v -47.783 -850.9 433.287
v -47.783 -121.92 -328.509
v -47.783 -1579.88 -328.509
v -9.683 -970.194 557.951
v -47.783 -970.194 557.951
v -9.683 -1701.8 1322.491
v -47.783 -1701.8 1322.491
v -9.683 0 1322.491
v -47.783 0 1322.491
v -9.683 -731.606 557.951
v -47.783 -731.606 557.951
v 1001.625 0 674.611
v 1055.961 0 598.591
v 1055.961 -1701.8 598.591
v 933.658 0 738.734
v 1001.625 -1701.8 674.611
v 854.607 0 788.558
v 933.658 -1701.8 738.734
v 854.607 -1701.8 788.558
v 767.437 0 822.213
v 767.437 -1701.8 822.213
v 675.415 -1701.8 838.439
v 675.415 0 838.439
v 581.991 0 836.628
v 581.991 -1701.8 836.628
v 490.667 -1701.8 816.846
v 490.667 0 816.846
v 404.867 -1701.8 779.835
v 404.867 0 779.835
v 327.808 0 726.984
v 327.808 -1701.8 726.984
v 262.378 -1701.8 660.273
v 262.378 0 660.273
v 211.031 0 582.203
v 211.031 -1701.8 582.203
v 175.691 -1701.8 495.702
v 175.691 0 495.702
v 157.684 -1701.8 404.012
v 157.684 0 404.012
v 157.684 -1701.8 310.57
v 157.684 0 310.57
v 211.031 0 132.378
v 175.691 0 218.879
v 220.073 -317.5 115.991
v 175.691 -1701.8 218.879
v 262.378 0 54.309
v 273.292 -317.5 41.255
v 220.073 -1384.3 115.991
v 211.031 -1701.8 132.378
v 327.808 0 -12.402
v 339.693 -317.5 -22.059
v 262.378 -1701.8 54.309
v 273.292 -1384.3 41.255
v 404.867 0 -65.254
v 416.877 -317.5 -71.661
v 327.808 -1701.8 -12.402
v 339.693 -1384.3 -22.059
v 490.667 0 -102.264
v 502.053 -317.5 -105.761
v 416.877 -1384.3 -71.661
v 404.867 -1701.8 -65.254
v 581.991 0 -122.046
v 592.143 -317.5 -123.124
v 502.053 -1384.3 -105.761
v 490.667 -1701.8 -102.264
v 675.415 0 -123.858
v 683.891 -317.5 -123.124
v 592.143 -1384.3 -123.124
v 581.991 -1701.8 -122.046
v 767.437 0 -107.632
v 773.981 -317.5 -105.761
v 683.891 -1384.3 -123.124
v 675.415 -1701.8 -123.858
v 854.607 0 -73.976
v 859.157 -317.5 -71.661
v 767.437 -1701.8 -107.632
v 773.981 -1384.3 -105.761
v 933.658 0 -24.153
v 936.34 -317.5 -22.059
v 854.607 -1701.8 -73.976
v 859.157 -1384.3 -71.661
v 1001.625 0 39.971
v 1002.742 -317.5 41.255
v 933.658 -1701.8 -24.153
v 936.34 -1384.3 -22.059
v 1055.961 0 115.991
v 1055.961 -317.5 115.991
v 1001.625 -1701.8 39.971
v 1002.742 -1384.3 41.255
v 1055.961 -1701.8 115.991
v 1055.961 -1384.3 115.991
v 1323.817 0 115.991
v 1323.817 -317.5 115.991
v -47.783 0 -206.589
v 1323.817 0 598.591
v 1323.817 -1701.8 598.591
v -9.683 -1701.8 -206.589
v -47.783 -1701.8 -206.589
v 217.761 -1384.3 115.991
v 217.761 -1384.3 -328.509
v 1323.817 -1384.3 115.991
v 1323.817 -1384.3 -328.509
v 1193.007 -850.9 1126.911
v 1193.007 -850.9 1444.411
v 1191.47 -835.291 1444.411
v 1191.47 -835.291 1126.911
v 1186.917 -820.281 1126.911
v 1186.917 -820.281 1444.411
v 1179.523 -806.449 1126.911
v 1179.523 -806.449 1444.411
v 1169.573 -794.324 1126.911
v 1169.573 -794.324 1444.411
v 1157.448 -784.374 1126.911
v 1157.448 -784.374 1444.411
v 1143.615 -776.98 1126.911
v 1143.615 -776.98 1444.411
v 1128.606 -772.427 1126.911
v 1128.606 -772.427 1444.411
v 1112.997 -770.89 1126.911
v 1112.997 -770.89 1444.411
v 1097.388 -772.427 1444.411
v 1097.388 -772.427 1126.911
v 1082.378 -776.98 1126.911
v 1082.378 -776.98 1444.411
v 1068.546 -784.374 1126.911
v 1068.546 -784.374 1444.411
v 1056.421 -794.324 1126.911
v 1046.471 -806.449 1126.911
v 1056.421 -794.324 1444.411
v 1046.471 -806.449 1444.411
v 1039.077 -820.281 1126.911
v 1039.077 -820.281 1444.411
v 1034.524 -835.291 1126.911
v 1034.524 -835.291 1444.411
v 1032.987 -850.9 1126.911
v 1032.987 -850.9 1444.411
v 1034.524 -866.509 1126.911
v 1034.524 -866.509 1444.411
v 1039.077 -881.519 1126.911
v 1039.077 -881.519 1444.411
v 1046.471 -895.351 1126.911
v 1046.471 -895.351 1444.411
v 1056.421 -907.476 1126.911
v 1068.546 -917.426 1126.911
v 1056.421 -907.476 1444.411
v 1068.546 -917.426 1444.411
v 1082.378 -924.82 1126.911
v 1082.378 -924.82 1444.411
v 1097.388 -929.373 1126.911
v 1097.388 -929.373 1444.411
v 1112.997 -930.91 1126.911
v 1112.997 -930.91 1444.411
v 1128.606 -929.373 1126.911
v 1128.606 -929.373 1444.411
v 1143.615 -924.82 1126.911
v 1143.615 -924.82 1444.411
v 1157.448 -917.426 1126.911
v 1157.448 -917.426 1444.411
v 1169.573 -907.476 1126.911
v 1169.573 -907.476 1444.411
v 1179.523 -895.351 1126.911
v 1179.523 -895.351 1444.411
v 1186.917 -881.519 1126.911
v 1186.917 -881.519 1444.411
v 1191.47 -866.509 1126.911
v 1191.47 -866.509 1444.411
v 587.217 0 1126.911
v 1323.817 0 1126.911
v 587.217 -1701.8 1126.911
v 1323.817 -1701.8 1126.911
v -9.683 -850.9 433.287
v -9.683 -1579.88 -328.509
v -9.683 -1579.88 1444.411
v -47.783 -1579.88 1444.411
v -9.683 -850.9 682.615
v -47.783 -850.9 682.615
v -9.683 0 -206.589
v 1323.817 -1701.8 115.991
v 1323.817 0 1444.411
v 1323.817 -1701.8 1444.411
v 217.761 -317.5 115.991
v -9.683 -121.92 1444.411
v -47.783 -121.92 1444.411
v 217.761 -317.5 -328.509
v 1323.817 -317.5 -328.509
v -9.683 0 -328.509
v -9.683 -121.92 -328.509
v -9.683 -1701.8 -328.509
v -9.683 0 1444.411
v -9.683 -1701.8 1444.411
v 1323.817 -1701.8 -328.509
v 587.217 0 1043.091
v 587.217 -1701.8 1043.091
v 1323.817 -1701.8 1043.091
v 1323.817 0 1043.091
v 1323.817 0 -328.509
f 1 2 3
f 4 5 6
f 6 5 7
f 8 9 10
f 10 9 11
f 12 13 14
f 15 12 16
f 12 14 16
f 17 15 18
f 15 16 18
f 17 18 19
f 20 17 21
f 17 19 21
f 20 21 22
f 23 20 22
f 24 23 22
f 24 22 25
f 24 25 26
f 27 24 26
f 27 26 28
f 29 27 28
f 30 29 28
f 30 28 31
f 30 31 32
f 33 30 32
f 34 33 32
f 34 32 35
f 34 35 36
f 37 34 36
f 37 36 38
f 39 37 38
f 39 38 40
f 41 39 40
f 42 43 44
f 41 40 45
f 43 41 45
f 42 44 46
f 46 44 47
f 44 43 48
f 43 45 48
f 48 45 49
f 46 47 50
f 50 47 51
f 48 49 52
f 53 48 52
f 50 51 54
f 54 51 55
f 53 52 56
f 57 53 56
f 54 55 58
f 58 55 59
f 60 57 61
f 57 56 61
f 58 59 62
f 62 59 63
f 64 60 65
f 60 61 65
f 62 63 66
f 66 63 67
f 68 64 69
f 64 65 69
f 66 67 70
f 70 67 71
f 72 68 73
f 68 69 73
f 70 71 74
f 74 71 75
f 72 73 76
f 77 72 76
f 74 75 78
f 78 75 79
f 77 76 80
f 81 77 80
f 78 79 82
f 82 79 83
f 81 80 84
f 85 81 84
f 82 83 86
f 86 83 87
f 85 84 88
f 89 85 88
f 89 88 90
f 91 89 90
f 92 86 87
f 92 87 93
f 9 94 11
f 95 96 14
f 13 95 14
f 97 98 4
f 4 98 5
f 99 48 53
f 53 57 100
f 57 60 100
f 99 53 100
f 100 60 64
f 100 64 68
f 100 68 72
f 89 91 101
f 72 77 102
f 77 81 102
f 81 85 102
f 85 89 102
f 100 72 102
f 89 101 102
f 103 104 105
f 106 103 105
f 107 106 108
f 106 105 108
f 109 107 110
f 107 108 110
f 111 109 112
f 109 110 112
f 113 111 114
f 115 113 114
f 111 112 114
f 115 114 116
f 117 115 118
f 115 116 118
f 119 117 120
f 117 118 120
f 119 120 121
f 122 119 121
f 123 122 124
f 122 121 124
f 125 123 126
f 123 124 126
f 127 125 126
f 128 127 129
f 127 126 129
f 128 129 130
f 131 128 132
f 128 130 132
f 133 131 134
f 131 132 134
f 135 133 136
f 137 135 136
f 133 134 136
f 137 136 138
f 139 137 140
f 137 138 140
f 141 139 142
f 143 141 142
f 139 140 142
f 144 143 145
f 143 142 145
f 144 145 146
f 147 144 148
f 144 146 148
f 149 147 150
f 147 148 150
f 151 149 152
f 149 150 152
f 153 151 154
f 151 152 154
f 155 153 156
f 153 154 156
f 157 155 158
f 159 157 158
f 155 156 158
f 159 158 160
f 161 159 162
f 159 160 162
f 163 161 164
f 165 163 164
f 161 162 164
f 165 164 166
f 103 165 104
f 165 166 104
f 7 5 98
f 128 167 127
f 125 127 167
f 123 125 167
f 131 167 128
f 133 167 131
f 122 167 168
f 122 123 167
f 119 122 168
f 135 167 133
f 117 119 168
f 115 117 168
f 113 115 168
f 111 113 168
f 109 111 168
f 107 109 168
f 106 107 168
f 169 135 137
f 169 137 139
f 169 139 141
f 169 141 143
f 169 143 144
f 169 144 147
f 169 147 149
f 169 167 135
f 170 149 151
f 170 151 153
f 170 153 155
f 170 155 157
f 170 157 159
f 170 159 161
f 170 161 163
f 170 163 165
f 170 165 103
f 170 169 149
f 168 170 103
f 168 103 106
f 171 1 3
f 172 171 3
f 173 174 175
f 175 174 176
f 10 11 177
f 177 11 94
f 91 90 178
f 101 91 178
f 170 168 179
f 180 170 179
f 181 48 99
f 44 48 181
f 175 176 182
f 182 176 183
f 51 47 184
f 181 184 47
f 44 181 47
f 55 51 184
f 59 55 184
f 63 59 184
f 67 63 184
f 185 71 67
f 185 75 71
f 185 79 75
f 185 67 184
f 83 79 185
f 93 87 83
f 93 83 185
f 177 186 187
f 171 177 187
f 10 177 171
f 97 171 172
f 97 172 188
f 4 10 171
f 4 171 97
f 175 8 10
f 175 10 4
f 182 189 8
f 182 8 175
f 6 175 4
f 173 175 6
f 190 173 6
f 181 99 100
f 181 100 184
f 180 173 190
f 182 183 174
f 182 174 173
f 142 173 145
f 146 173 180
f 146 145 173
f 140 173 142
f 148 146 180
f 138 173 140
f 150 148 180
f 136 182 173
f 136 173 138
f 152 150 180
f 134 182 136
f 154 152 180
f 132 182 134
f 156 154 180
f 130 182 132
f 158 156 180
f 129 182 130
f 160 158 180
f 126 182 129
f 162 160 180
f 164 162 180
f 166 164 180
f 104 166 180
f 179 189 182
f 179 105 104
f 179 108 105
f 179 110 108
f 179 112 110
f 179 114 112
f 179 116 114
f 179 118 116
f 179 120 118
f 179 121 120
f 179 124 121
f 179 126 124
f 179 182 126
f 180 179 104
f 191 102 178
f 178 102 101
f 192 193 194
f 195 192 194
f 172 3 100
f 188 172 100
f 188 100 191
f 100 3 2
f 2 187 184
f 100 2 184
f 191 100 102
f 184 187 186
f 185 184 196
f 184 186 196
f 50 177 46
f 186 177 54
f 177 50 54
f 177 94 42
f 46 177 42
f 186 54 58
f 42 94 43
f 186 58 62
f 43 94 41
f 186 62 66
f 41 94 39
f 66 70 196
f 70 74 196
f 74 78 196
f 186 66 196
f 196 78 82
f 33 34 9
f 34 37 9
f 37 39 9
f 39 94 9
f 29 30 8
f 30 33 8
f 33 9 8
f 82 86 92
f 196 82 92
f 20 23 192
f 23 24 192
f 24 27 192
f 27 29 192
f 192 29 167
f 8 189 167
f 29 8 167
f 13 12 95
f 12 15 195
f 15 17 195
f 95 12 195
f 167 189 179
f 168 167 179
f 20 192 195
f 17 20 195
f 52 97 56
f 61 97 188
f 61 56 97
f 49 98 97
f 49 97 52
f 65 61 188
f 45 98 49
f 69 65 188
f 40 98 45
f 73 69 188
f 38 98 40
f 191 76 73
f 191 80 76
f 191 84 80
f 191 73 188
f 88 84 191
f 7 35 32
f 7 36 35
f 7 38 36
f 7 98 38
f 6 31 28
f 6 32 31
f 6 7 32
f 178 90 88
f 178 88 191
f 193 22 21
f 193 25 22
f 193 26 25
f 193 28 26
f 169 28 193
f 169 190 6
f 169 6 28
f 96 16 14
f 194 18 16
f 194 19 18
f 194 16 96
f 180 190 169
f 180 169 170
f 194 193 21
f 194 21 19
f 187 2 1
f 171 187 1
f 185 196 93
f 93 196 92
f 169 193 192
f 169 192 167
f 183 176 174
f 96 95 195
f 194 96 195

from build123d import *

# Parameters (mm, degrees)
F0_W      = 1371.6
F0_H      = 1772.92
F1_DEPTH  = 1701.8
F2_W      = 736.6
F2_H      = 83.82
F3_DEPTH  = 1701.8
F4_W      = 267.8561401336
F4_H      = 1066.8
F5_DEPTH  = 762
F6_DEPTH  = 838.2
F7_R      = 80.01
F8_DEPTH  = 317.5
F10_DEPTH = 38.1
F11_DEPTH = 38.1


with BuildPart() as f1:
    # F0 (on Front) → F1 (new body)
    with BuildSketch(Plane.XZ):
        with Locations((638.0169455886, 557.9506990528)):
            Rectangle(F0_W, F0_H)
    extrude(amount=F1_DEPTH)

    # F2 (on face) → F3 (cut)
    with BuildSketch(Plane.XZ.offset(1701.8)):
        with Locations((955.5169455886, 1085.0006990528)):
            Rectangle(F2_W, F2_H)
        with BuildLine():
            Line((1323.8169455886, 115.9906990528), (1323.8169455886, 598.5906990528))
            Line((1323.8169455886, 598.5906990528), (1055.960805455, 598.5906990528))
            ThreePointArc((1055.960805455, 598.5906990528), (1104.1727493557, 482.1967702193), (1120.6169455886, 357.2906990528))
            ThreePointArc((1120.6169455886, 357.2906990528), (1104.1727493557, 232.3846278863), (1055.960805455, 115.9906990528))
            Line((1055.960805455, 115.9906990528), (1323.8169455886, 115.9906990528))
        make_face()
        with BuildLine():
            ThreePointArc((1120.6169455886, 357.2906990528), (1104.1727493557, 482.1967702193), (1055.960805455, 598.5906990528))
            ThreePointArc((1055.960805455, 598.5906990528), (220.0730857222, 598.5906990528), (638.0169455886, -125.3093009472))
            ThreePointArc((638.0169455886, -125.3093009472), (879.3169455886, -60.6531608136), (1055.960805455, 115.9906990528))
            ThreePointArc((1055.960805455, 115.9906990528), (1104.1727493557, 232.3846278863), (1120.6169455886, 357.2906990528))
        make_face()
    extrude(amount=-F3_DEPTH, mode=Mode.SUBTRACT)

    # F4 (on face) → F5 (cut)
    with BuildSketch(Plane.XY.offset(115.9906990528)):
        with Locations((1189.8888755218, -850.9)):
            Rectangle(F4_W, F4_H)
    extrude(amount=-F5_DEPTH, mode=Mode.SUBTRACT)

    # F6 (cut): a face of the model
    f6_faces = [f1.faces().sort_by_distance(p)[0] for p in [
        (1055.960805455, -850.9, -106.2593009472),
    ]]
    extrude(f6_faces, amount=-F6_DEPTH, mode=Mode.SUBTRACT)

    # F7 (on face) → F8 (cut)
    with BuildSketch(Plane.XY.offset(1444.4106990528)):
        with Locations((1112.9969455886, -850.9)):
            Circle(F7_R)
    extrude(amount=-F8_DEPTH, mode=Mode.SUBTRACT)

    # F9 (on face) → F10 (cut)
    with BuildSketch(Plane(origin=(-47.7830544114, 0, 0), x_dir=(0, -1, 0), z_dir=(-1, 0, 0))):
        Polygon((0, 1444.4106990528), (0, 1322.4906990528), (121.92, 1444.4106990528), align=None)
        Polygon((0, -206.5893009472), (0, -328.5093009472), (121.92, -328.5093009472), align=None)
        Polygon((1701.8, -206.5893009472), (1579.88, -328.5093009472), (1701.8, -328.5093009472), align=None)
        Polygon((1579.88, 1444.4106990528), (1701.8, 1322.4906990528), (1701.8, 1444.4106990528), align=None)
    extrude(amount=-F10_DEPTH, mode=Mode.SUBTRACT)

    # F9 (on face) → F11 (cut)
    with BuildSketch(Plane(origin=(-47.7830544114, 0, 0), x_dir=(0, -1, 0), z_dir=(-1, 0, 0))):
        Polygon((0, 1322.4906990528), (731.6059692308, 557.9506990528), (850.9, 682.6148791171), (121.92, 1444.4106990528), align=None)
        Polygon((731.6059692308, 557.9506990528), (850.9, 433.2865189885), (970.1940307692, 557.9506990528), (850.9, 682.6148791171), align=None)
        Polygon((850.9, 682.6148791171), (970.1940307692, 557.9506990528), (1701.8, 1322.4906990528), (1579.88, 1444.4106990528), align=None)
        Polygon((970.1940307692, 557.9506990528), (850.9, 433.2865189885), (1579.88, -328.5093009472), (1701.8, -206.5893009472), align=None)
        Polygon((0, -206.5893009472), (121.92, -328.5093009472), (850.9, 433.2865189885), (731.6059692308, 557.9506990528), align=None)
    extrude(amount=-F11_DEPTH, mode=Mode.SUBTRACT)


solid = f1.part
